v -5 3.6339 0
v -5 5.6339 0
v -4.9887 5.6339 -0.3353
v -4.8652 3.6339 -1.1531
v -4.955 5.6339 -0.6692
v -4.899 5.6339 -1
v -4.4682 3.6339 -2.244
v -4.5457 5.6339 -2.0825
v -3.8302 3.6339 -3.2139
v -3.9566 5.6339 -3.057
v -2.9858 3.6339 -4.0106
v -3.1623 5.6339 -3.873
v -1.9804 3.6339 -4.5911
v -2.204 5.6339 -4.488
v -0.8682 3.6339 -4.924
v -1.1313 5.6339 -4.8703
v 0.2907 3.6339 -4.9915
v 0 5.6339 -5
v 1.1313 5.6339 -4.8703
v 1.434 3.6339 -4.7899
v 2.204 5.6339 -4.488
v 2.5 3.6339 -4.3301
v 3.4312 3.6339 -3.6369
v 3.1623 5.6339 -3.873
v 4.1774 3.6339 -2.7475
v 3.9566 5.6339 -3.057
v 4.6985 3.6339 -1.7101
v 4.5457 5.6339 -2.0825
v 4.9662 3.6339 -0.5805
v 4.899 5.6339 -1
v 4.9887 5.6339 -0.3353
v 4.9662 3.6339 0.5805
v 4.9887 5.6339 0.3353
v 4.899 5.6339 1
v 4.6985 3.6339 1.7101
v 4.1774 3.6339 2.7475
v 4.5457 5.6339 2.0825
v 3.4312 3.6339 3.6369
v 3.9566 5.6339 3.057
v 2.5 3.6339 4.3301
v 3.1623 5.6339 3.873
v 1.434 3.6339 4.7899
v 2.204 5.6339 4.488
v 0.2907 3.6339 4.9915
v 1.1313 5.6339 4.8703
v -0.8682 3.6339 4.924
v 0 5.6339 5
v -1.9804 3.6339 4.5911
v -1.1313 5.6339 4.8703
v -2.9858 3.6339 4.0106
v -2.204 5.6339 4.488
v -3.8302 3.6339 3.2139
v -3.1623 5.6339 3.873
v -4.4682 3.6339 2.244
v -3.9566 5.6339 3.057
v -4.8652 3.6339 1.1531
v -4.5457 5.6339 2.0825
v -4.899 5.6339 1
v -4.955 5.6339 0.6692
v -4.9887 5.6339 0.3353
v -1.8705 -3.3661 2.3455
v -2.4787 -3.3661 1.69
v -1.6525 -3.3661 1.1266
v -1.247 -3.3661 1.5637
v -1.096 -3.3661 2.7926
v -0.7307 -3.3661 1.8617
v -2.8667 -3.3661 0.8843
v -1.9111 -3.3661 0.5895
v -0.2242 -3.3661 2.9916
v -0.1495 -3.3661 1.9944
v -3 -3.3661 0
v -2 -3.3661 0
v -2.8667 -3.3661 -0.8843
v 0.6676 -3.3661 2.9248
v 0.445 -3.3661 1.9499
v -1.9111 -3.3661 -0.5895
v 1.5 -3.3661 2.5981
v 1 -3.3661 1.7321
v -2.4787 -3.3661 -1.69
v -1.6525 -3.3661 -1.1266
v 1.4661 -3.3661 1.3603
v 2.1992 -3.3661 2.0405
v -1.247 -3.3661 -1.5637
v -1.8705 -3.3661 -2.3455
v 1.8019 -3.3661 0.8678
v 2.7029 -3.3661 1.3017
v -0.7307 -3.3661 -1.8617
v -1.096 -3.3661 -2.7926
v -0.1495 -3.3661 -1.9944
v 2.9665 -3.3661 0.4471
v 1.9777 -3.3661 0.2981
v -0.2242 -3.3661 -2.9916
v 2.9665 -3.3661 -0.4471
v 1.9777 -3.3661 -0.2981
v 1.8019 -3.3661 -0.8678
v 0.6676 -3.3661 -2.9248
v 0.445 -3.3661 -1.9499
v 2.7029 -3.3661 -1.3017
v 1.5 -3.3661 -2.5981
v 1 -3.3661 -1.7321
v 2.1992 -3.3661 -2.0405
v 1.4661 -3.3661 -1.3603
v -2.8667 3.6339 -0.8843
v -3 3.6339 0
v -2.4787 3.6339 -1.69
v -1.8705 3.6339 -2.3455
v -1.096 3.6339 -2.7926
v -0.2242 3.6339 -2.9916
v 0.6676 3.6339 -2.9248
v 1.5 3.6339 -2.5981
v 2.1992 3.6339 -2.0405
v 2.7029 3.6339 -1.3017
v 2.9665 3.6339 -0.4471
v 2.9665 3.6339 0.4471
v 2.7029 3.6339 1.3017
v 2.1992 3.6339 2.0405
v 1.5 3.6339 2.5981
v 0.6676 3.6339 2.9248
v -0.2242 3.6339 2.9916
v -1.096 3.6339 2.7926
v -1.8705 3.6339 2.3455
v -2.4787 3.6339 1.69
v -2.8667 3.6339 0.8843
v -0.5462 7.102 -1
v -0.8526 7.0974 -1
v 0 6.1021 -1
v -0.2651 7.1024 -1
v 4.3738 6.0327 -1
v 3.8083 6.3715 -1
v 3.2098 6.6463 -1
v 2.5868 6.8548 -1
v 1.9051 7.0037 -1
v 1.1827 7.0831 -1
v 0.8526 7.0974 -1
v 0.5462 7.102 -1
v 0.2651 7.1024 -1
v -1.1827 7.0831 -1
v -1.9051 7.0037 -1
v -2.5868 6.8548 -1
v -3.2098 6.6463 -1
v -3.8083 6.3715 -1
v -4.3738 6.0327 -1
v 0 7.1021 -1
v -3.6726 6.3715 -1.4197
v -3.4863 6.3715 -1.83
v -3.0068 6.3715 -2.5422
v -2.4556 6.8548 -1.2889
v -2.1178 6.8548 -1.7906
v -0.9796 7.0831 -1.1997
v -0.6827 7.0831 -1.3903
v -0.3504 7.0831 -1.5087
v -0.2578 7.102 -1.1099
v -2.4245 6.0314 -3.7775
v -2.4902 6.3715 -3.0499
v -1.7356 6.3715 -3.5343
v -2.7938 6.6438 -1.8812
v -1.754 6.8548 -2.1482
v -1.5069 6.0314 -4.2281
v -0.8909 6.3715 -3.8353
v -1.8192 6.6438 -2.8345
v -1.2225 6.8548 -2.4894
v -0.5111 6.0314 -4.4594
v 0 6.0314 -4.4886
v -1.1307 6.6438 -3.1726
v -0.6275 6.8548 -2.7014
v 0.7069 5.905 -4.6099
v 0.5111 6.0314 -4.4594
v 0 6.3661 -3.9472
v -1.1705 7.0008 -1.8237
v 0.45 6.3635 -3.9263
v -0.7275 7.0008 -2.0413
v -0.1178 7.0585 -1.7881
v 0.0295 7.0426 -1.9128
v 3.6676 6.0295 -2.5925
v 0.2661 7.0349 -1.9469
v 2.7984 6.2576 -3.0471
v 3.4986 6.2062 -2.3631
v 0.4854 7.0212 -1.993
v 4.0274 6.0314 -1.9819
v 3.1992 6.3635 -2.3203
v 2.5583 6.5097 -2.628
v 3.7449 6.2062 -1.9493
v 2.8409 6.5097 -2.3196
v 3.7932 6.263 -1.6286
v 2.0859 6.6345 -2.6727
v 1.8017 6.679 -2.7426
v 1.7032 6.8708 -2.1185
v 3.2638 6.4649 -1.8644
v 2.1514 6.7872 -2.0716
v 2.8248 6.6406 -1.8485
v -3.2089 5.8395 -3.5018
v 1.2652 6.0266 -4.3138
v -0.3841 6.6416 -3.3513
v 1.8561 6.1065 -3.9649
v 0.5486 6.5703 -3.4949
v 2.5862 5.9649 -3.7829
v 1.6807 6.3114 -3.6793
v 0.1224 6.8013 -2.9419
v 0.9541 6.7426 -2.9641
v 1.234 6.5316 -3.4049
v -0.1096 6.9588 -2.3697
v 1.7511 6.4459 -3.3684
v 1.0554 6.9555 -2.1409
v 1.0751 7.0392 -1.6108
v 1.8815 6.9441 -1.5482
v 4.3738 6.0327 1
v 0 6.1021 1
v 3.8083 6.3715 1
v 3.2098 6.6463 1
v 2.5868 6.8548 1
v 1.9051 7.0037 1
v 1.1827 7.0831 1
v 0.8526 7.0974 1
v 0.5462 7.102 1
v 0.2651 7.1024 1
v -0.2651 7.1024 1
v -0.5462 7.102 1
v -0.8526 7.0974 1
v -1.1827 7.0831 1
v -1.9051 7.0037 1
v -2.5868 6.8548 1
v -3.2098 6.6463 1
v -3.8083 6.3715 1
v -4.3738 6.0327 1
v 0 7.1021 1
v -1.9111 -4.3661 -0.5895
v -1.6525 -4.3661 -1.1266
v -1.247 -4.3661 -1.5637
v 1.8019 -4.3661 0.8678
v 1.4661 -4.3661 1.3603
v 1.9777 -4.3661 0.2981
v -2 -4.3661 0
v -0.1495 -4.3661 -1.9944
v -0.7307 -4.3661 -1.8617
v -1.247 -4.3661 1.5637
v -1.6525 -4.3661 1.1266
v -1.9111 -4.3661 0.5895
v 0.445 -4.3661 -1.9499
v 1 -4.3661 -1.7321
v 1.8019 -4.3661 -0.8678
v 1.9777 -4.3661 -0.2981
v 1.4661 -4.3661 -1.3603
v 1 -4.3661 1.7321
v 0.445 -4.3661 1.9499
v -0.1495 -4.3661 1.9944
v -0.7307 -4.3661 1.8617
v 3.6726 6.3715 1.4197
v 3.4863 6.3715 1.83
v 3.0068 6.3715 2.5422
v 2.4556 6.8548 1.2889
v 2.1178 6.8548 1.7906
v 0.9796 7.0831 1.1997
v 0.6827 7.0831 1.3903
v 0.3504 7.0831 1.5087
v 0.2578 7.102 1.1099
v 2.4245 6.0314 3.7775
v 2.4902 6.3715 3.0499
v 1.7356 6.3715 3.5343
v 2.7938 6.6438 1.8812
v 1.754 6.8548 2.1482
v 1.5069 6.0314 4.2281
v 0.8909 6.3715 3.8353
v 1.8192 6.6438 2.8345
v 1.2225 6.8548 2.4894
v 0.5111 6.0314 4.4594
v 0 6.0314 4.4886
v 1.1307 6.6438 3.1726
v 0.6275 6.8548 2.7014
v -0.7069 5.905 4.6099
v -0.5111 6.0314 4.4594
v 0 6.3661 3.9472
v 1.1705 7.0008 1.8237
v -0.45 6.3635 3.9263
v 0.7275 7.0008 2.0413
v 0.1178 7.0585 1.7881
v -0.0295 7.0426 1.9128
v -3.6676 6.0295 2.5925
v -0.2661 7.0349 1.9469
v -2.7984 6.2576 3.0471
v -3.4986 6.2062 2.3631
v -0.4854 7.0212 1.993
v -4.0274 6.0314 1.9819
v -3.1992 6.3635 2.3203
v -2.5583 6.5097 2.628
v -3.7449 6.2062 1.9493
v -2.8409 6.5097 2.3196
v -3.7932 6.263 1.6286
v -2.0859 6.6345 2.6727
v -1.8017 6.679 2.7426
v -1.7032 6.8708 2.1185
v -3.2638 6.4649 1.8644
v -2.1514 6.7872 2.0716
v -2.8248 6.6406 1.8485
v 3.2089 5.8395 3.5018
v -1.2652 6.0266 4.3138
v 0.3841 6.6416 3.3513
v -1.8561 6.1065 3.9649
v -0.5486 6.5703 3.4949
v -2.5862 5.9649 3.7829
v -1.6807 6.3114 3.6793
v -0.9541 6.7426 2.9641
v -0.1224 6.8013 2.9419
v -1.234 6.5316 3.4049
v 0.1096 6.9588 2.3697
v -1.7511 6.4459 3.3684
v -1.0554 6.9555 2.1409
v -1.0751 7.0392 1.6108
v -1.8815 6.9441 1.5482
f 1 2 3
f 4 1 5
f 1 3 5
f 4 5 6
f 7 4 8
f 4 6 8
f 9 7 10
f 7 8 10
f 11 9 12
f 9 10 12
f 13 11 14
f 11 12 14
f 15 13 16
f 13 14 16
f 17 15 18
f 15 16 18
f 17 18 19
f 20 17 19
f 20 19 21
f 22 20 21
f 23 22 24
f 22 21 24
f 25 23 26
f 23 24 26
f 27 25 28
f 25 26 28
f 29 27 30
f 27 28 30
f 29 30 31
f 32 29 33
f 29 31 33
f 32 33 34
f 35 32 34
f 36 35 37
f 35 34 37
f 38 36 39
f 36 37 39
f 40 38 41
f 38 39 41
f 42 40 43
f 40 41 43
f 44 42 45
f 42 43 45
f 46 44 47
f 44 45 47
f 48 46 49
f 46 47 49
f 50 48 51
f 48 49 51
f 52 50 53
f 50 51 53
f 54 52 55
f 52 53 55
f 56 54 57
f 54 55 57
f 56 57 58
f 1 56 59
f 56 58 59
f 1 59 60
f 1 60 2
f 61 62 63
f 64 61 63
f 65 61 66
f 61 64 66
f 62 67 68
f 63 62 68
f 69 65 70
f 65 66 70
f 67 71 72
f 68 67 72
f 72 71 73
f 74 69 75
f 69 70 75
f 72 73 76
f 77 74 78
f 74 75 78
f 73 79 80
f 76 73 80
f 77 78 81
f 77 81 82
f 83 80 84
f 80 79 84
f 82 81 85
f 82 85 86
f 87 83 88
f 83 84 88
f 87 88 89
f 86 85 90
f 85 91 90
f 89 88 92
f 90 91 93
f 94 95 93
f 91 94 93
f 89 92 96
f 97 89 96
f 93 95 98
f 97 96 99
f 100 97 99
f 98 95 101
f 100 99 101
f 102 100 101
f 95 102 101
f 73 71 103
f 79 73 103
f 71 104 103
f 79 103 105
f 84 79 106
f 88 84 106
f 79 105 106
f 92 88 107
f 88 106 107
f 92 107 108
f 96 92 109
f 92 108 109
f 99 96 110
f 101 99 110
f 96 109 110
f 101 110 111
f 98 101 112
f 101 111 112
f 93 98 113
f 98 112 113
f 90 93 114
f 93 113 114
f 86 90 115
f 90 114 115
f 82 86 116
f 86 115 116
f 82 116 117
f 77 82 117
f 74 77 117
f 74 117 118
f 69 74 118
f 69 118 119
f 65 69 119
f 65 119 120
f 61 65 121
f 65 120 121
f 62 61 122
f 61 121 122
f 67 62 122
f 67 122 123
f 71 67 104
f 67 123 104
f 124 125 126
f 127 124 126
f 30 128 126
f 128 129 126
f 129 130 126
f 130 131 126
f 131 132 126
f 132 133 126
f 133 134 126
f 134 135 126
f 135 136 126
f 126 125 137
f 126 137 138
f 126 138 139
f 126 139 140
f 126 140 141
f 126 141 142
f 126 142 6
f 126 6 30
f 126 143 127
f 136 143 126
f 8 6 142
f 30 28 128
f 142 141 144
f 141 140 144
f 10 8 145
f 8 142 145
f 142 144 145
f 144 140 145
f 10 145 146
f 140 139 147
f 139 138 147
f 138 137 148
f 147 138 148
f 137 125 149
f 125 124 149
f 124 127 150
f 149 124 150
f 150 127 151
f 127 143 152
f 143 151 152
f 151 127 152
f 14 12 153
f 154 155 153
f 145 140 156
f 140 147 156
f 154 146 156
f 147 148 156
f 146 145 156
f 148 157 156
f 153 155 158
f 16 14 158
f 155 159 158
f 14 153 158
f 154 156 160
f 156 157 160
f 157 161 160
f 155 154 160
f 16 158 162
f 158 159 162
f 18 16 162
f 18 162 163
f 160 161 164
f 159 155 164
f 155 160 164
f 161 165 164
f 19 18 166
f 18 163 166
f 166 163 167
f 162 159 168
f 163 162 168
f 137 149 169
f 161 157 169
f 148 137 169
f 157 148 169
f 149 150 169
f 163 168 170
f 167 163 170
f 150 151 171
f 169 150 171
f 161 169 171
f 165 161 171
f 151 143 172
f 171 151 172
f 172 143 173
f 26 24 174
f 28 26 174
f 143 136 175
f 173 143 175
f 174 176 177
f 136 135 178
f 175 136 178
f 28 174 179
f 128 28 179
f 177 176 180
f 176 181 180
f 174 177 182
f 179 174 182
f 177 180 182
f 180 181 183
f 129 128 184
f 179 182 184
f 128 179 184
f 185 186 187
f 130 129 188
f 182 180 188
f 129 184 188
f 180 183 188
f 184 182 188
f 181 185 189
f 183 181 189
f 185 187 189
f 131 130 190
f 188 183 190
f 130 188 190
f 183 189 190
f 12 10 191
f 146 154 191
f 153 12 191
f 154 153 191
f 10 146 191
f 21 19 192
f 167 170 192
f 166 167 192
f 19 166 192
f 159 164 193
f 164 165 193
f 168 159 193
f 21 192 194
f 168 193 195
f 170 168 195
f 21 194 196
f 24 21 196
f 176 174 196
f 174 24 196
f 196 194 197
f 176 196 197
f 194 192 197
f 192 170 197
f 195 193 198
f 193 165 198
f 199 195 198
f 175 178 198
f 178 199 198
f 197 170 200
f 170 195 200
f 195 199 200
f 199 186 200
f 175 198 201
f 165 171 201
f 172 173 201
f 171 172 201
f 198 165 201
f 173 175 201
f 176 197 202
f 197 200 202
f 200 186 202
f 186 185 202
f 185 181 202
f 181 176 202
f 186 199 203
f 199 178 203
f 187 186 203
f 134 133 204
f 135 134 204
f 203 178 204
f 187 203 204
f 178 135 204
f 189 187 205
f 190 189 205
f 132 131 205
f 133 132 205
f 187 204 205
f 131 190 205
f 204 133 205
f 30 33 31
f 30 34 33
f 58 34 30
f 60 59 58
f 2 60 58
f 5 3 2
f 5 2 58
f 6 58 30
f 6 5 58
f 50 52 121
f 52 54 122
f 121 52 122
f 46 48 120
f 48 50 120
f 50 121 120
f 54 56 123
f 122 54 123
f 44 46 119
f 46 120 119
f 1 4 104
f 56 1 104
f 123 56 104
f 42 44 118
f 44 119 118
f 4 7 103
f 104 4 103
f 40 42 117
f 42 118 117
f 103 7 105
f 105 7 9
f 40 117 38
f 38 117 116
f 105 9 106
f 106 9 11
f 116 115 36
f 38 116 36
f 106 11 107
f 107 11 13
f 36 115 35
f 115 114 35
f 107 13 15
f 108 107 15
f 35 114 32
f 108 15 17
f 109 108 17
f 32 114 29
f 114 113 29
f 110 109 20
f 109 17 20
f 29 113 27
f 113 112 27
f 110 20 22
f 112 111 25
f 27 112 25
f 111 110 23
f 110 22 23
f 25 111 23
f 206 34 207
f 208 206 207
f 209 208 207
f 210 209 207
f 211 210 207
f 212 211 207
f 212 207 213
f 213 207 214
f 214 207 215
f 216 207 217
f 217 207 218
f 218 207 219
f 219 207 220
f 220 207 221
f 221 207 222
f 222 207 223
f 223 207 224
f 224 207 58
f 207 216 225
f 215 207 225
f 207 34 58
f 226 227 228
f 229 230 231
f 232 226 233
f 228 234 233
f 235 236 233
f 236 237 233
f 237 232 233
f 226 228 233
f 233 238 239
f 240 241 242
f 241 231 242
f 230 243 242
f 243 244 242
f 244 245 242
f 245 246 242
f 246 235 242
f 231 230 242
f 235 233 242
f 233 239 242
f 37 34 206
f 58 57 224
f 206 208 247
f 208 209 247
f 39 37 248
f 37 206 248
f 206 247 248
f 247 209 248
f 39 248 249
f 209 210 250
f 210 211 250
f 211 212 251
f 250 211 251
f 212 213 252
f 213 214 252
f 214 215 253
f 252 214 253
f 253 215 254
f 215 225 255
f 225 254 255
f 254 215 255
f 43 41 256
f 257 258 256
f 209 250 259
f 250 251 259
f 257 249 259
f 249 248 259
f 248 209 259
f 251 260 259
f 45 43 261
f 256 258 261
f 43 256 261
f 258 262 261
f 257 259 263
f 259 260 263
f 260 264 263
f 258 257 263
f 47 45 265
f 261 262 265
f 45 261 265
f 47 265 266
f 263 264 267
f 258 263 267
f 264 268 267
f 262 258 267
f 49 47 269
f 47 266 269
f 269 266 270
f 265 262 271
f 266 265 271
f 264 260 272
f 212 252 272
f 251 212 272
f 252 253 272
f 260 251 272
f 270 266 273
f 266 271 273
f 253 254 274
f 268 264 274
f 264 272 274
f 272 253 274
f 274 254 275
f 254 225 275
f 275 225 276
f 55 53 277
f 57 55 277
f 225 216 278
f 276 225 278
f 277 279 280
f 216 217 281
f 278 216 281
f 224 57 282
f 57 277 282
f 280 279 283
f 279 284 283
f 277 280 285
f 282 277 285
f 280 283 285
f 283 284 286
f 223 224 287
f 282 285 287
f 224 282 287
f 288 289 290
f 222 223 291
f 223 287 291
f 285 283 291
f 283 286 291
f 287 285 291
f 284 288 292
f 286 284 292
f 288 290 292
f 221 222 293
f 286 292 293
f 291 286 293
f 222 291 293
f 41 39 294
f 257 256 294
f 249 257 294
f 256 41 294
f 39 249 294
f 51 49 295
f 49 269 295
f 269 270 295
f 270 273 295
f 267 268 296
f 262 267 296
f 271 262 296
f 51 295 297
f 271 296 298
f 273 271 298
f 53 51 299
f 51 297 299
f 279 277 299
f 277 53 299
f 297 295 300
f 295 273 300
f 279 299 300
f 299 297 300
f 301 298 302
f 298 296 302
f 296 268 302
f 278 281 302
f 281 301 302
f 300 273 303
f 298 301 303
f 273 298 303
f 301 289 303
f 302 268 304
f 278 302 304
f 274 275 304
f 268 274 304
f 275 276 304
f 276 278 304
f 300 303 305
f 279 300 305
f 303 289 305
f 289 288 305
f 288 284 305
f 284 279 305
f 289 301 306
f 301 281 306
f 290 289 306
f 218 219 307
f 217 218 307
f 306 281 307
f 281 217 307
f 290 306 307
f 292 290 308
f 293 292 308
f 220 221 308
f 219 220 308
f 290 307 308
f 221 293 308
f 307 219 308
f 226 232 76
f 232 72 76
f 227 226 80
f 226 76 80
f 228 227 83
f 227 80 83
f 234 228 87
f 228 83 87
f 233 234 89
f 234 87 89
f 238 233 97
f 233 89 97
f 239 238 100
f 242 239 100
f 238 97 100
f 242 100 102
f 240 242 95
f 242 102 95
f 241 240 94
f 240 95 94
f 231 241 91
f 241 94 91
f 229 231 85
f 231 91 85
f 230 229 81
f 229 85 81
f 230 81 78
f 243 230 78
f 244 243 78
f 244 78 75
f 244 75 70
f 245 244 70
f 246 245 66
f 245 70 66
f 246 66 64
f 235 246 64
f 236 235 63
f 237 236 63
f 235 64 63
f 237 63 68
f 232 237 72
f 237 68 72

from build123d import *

# Parameters (mm, degrees)
CUT_EXTRUDE6_DEPTH = 10


with BuildPart() as part:
    # Sketch1 → Revolve2 (revolve)
    with BuildSketch(Plane.XY):
        with BuildLine():
            Line((0, 6.102087539), (0, -3.366129571))
            Line((0, -3.366129571), (0, -4.366129571))
            Line((0, -4.366129571), (-2, -4.366129571))
            Line((-2, -4.366129571), (-2, -3.366129571))
            Line((-2, -3.366129571), (-3, -3.366129571))
            Line((-3, -3.366129571), (-3, 3.633870429))
            Line((-3, 3.633870429), (-5, 3.633870429))
            Line((-5, 3.633870429), (-5, 5.633870429))
            ThreePointArc((-5, 5.633870429), (-3.134722719, 6.735016577), (-1, 7.102087539))
            Line((-1, 7.102087539), (-1, 6.102087539))
            Line((-1, 6.102087539), (0, 6.102087539))
        make_face()
    revolve(axis=Axis((0, 6.102087539, 0), (0, -1, 0)))

    # Sketch2 → Cut-Extrude6 (cut)
    with BuildSketch(Plane.ZY.offset(5)):
        Polygon((-1, 7.153918726), (-1, 7.78774413), (1, 7.78774413), (1, 7.102087539), (1, 5.633870429), (-1, 5.633870429), (-1, 7.102087539), align=None)
    extrude(amount=-CUT_EXTRUDE6_DEPTH, mode=Mode.SUBTRACT)


solid = part.part
